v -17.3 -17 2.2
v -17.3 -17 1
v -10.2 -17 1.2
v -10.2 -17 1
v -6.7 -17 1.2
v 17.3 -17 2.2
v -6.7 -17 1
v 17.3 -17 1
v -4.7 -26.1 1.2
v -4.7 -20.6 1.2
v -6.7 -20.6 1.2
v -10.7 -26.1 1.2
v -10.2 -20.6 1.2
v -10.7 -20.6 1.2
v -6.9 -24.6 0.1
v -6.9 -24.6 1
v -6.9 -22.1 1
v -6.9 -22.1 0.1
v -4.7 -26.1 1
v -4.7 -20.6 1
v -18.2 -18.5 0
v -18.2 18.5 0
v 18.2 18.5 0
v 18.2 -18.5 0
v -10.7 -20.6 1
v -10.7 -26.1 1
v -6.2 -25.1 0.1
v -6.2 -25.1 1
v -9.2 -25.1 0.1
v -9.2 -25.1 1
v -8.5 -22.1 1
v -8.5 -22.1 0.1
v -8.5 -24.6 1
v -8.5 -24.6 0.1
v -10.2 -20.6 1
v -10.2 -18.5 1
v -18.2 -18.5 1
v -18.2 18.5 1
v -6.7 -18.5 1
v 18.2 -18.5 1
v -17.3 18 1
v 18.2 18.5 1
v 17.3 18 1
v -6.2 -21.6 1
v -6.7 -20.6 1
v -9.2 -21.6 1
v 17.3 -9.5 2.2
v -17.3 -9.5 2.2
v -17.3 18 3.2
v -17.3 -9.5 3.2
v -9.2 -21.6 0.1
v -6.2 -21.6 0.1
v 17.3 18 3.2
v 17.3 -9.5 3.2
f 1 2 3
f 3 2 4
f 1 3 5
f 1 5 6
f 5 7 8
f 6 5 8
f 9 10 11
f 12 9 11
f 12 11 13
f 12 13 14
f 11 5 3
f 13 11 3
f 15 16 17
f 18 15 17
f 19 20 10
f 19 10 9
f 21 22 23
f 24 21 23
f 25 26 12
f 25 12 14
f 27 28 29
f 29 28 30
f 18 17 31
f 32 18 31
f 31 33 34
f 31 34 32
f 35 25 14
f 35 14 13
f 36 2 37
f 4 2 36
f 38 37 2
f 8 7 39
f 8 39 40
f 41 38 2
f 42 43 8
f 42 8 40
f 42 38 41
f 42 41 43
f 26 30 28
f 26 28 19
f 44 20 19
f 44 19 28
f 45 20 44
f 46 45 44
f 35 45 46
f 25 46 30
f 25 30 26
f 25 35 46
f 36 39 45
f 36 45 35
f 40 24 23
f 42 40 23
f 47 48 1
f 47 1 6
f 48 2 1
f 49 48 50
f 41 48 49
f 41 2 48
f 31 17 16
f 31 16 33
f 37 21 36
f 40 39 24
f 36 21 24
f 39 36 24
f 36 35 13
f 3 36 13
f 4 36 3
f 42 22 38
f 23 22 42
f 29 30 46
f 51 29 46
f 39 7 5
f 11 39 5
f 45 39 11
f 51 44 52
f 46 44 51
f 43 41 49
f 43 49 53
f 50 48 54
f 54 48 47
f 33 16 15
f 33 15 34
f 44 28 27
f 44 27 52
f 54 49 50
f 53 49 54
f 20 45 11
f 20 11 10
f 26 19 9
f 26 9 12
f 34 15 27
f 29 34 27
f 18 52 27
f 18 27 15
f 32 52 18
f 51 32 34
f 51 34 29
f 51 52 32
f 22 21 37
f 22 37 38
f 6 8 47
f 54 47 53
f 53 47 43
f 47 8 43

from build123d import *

# Parameters (mm, degrees)
SKETCH1_W           = 36.4
SKETCH1_H           = 37
BOSS_EXTRUDE1_DEPTH = 1
SKETCH2_W           = 34.6
SKETCH2_H           = 27.5
BOSS_EXTRUDE2_DEPTH = 2.2
SKETCH3_W           = 34.6
SKETCH3_H           = 7.5
BOSS_EXTRUDE3_DEPTH = 1.2
BOSS_EXTRUDE4_DEPTH = 0.2
SKETCH5_W           = 3
SKETCH5_H           = 3.5
SKETCH5_W_2         = 1.6
SKETCH5_H_2         = 2.5
BOSS_EXTRUDE5_DEPTH = 0.9


with BuildPart() as part:
    # Sketch1 → Boss-Extrude1 (new body)
    with BuildSketch(Plane.XY):
        Rectangle(SKETCH1_W, SKETCH1_H)
    extrude(amount=BOSS_EXTRUDE1_DEPTH)

    # Sketch2 → Boss-Extrude2 (add)
    with BuildSketch(Plane.XY.offset(1)):
        with Locations((0, 4.25)):
            Rectangle(SKETCH2_W, SKETCH2_H)
    extrude(amount=BOSS_EXTRUDE2_DEPTH)

    # Sketch3 → Boss-Extrude3 (add)
    with BuildSketch(Plane.XY.offset(1)):
        with Locations((0, -13.25)):
            Rectangle(SKETCH3_W, SKETCH3_H)
    extrude(amount=BOSS_EXTRUDE3_DEPTH)

    # Sketch4 → Boss-Extrude4 (add)
    with BuildSketch(Plane.XY.offset(1)):
        Polygon((-10.2, -17), (-6.7, -17), (-6.7, -20.6), (-4.7, -20.6), (-4.7, -26.1), (-10.7, -26.1), (-10.7, -20.6), (-10.2, -20.6), align=None)
    extrude(amount=BOSS_EXTRUDE4_DEPTH)

    # Sketch5 → Boss-Extrude5 (add)
    with BuildSketch(Plane(origin=(0, 0, 1), x_dir=(-1, 0, 0), z_dir=(0, 0, -1))):
        with Locations((7.7, -23.35)):
            Rectangle(SKETCH5_W, SKETCH5_H)
        with Locations((7.7, -23.35)):
            Rectangle(SKETCH5_W_2, SKETCH5_H_2, mode=Mode.SUBTRACT)
    extrude(amount=BOSS_EXTRUDE5_DEPTH)


solid = part.part
